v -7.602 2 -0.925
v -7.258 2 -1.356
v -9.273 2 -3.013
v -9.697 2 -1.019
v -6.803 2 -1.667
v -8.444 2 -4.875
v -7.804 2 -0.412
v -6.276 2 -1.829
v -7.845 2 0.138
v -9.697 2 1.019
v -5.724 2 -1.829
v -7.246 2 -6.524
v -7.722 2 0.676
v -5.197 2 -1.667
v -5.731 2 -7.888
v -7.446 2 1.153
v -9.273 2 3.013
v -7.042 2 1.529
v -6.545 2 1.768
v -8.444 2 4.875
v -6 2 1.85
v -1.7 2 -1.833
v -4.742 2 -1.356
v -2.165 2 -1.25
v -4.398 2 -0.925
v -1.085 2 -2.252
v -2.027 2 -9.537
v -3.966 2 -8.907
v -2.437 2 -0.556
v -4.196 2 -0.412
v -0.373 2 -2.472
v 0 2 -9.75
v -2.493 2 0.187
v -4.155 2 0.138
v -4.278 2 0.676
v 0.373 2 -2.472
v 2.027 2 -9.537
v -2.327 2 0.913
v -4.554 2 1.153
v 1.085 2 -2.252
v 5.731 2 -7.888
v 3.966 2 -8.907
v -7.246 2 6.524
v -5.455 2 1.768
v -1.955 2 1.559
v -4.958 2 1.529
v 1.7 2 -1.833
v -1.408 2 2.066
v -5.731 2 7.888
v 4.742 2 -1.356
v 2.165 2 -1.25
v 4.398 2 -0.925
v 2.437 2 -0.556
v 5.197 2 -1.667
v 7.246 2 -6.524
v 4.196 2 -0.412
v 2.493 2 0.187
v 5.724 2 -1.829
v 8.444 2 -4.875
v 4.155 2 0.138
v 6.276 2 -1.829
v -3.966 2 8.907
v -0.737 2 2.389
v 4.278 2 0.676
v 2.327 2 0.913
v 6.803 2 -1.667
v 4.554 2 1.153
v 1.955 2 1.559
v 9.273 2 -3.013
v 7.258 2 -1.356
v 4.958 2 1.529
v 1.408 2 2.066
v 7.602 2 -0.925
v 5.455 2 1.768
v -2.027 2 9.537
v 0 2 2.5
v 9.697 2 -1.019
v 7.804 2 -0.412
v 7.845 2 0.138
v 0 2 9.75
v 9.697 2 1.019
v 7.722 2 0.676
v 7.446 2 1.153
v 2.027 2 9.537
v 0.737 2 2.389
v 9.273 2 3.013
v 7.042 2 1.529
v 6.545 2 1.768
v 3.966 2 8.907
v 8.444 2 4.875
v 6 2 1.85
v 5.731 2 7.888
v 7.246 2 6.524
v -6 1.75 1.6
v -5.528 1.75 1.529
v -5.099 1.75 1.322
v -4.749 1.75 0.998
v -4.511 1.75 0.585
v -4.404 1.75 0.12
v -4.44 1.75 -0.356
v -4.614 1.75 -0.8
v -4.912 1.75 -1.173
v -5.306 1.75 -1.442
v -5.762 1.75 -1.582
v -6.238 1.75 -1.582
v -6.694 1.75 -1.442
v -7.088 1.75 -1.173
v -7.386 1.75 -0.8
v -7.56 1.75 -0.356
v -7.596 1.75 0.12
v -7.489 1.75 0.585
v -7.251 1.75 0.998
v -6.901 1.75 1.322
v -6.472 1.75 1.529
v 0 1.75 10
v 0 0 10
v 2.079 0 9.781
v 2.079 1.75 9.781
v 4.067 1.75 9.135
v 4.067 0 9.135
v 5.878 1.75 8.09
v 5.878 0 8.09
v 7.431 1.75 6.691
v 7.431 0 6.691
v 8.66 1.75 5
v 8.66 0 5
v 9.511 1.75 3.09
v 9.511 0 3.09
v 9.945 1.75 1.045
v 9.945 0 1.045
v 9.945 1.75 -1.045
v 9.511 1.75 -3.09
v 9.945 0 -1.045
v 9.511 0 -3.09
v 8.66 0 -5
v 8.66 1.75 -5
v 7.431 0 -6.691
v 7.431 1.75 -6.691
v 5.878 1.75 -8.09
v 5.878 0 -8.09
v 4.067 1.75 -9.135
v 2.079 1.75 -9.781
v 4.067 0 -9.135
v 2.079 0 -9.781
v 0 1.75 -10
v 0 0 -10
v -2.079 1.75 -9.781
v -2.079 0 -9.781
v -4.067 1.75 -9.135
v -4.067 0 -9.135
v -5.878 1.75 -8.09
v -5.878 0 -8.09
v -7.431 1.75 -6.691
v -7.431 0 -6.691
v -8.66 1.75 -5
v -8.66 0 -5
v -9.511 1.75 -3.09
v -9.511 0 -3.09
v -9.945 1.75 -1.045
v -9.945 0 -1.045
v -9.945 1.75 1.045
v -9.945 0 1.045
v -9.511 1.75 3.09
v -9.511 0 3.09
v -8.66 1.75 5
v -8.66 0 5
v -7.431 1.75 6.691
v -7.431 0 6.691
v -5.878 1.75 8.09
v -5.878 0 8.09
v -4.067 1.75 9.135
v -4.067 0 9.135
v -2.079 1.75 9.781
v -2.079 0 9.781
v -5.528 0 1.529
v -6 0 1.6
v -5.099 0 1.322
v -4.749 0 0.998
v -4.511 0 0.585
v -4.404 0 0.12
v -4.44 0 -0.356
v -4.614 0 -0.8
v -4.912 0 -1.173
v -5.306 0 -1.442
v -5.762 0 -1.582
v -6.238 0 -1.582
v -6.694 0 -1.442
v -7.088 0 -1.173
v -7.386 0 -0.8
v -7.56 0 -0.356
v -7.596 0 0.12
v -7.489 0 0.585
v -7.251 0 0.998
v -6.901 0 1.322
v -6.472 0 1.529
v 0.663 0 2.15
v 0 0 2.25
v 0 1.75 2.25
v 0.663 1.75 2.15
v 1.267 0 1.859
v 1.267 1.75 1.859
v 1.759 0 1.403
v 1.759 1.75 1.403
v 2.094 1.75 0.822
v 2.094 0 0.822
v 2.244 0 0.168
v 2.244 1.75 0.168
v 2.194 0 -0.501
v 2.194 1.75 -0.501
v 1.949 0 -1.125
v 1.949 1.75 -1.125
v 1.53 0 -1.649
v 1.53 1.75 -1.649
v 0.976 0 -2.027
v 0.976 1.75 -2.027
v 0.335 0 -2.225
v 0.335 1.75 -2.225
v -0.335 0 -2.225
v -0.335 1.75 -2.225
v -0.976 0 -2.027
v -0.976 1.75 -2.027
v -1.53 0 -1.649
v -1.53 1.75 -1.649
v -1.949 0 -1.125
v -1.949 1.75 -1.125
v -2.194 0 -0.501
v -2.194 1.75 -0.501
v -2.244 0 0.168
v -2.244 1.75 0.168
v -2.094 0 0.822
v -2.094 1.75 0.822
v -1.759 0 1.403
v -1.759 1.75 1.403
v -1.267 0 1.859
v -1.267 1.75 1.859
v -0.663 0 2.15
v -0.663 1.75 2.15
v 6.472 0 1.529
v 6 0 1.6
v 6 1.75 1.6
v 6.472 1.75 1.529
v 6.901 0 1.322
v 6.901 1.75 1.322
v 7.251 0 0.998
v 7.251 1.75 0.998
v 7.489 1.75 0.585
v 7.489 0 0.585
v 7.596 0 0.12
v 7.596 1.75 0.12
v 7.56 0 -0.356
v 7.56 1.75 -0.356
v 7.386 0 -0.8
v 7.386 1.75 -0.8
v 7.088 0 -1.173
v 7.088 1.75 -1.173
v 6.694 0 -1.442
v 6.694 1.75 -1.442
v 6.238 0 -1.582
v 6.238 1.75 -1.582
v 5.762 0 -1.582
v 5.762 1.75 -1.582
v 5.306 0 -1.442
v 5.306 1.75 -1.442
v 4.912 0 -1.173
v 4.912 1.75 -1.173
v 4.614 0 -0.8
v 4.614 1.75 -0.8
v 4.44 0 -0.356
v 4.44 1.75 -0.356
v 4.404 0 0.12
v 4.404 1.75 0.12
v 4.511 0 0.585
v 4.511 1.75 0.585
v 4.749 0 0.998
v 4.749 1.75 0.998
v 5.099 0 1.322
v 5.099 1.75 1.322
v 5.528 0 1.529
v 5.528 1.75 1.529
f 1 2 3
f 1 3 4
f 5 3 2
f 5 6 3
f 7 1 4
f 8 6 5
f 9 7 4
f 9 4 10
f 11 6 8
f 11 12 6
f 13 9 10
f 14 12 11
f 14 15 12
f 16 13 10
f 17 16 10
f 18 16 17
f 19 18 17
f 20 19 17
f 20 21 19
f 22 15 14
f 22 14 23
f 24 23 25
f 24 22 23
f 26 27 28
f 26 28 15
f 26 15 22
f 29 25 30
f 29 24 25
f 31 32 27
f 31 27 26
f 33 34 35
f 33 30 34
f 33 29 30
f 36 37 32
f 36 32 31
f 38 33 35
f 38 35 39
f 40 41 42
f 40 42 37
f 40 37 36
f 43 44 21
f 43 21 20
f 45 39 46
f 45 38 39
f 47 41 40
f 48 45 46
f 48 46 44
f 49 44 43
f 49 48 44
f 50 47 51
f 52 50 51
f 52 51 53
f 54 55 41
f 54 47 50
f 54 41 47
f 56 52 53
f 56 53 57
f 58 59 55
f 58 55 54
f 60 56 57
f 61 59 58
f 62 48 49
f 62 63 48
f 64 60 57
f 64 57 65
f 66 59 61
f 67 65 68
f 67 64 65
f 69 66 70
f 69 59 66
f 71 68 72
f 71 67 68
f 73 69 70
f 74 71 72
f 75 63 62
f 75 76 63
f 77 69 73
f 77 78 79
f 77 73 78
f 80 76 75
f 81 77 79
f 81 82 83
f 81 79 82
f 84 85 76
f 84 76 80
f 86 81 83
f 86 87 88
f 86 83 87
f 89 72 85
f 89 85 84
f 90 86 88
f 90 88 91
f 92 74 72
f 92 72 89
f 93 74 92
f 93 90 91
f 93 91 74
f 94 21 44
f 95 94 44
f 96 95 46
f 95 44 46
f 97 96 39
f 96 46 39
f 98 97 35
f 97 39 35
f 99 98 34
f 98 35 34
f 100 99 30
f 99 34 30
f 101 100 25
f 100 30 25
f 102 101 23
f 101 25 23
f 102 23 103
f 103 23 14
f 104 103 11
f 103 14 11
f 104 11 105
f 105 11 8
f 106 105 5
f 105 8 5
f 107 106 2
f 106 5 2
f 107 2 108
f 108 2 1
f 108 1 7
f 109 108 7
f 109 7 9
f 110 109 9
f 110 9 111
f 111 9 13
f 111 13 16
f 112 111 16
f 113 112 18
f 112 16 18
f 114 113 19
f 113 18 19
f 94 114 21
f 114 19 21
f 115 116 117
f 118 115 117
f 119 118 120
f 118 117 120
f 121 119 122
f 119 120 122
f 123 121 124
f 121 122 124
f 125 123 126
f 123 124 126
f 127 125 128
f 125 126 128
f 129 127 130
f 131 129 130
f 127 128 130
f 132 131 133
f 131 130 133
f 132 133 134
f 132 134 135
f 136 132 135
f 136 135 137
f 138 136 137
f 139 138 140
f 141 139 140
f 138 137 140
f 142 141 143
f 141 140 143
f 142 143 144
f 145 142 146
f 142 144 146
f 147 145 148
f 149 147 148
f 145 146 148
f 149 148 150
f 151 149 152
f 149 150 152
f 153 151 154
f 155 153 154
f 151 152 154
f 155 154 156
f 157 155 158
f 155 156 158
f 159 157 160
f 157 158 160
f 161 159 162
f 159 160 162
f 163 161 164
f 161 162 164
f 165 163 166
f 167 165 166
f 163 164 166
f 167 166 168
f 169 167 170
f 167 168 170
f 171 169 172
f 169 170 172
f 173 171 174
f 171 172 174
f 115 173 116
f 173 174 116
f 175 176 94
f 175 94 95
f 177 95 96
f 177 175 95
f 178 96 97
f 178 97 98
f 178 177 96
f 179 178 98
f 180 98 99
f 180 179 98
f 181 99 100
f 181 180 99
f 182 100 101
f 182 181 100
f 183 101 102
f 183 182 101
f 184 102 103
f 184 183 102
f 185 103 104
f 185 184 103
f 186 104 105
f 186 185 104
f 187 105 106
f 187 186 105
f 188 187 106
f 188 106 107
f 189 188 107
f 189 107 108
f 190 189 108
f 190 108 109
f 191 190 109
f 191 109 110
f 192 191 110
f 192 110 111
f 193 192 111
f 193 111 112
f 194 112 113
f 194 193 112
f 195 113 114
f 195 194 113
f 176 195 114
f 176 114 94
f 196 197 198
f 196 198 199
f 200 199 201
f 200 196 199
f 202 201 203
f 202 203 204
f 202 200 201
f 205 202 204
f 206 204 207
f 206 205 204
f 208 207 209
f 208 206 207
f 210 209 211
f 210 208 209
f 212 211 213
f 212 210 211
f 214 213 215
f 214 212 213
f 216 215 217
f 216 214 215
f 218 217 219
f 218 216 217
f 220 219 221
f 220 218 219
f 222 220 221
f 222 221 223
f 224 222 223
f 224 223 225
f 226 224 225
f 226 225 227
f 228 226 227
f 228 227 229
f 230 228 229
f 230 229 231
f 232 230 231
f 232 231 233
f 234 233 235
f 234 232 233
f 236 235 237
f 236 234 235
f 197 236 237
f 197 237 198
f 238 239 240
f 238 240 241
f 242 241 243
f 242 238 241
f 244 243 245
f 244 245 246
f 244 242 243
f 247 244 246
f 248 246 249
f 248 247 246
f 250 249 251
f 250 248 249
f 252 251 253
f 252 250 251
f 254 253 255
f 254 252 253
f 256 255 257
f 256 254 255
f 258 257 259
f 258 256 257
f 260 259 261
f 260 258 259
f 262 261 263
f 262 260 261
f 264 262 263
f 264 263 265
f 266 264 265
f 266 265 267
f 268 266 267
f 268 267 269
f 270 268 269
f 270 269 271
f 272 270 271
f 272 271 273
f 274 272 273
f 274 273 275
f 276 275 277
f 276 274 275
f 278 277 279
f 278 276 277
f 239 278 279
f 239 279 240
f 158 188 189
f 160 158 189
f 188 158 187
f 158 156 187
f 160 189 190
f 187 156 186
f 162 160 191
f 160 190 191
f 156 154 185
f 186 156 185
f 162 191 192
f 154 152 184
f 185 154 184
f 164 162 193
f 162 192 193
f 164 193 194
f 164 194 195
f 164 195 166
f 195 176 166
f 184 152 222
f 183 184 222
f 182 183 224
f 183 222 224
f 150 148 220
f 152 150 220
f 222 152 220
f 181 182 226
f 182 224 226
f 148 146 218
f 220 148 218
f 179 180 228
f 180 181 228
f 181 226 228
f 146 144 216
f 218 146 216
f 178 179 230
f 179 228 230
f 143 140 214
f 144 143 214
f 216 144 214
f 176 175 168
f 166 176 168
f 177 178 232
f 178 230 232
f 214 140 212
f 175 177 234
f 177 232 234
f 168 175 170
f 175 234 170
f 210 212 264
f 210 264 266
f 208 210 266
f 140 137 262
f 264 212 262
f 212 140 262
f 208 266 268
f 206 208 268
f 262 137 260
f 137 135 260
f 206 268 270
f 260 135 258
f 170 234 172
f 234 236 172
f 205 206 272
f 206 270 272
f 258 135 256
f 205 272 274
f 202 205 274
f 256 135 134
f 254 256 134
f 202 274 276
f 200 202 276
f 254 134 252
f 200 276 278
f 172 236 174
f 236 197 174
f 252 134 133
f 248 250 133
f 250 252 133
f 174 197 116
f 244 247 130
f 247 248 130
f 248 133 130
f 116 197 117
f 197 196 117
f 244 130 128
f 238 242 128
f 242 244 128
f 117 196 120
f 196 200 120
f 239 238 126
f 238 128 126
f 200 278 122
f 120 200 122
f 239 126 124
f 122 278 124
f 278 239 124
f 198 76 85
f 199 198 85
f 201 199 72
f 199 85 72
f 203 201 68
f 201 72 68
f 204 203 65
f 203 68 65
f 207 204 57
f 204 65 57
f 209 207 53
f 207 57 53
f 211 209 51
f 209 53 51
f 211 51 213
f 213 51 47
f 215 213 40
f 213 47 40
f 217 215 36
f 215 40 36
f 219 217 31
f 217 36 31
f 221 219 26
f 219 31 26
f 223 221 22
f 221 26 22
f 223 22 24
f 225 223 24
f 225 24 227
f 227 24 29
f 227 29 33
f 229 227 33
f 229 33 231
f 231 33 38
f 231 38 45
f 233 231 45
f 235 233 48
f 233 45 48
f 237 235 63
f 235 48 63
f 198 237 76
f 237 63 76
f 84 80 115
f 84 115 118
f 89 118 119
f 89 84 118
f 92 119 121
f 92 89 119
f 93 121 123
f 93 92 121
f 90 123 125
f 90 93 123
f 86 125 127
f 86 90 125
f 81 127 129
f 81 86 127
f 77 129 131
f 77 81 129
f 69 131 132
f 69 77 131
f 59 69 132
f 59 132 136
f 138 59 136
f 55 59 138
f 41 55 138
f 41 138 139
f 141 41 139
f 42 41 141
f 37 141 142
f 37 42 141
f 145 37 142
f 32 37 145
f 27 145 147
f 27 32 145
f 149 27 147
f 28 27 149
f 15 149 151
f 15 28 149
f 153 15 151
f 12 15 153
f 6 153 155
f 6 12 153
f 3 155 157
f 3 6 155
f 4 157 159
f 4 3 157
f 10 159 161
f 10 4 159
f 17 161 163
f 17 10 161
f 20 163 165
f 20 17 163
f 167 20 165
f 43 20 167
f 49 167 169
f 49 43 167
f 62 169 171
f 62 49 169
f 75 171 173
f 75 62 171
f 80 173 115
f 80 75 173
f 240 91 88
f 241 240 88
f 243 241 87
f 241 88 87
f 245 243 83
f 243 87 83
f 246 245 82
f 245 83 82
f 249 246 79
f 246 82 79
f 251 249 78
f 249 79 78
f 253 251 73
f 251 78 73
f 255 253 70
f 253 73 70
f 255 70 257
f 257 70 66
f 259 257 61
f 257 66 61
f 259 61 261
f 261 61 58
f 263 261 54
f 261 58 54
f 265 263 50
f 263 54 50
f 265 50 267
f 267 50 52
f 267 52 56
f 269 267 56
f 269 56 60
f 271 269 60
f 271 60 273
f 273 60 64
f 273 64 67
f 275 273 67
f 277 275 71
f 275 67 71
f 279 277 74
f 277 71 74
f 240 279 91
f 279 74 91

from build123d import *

# Parameters (mm, degrees)
SKETCH1_R           = 10
SKETCH1_R_2         = 1.6
SKETCH1_R_3         = 2.25
BOSS_EXTRUDE1_DEPTH = 2
CHAMFER1_SIZE       = 0.25


with BuildPart() as part:
    # Sketch1 → Boss-Extrude1 (new body)
    with BuildSketch(Plane(origin=(0, 0, 0), x_dir=(1, 0, 0), z_dir=(0, 1, 0))):
        with Locations(Location((0, 0, 0), (0, 0, 270))):
            Circle(SKETCH1_R)
        with Locations(Location((-6, 0, 0), (0, 0, 270))):
            Circle(SKETCH1_R_2, mode=Mode.SUBTRACT)
        with Locations(Location((6, 0, 0), (0, 0, 270))):
            Circle(SKETCH1_R_2, mode=Mode.SUBTRACT)
        with Locations(Location((0, 0, 0), (0, 0, 270))):
            Circle(SKETCH1_R_3, mode=Mode.SUBTRACT)
    extrude(amount=BOSS_EXTRUDE1_DEPTH)

    # Chamfer1
    chamfer1_edges = [part.edges().sort_by_distance(p)[0] for p in [
        (0, 2, -2.25),
        (0, 2, -10),
        (-6, 2, -1.6),
        (6, 2, -1.6),
    ]]
    chamfer(chamfer1_edges, length=CHAMFER1_SIZE)


solid = part.part
